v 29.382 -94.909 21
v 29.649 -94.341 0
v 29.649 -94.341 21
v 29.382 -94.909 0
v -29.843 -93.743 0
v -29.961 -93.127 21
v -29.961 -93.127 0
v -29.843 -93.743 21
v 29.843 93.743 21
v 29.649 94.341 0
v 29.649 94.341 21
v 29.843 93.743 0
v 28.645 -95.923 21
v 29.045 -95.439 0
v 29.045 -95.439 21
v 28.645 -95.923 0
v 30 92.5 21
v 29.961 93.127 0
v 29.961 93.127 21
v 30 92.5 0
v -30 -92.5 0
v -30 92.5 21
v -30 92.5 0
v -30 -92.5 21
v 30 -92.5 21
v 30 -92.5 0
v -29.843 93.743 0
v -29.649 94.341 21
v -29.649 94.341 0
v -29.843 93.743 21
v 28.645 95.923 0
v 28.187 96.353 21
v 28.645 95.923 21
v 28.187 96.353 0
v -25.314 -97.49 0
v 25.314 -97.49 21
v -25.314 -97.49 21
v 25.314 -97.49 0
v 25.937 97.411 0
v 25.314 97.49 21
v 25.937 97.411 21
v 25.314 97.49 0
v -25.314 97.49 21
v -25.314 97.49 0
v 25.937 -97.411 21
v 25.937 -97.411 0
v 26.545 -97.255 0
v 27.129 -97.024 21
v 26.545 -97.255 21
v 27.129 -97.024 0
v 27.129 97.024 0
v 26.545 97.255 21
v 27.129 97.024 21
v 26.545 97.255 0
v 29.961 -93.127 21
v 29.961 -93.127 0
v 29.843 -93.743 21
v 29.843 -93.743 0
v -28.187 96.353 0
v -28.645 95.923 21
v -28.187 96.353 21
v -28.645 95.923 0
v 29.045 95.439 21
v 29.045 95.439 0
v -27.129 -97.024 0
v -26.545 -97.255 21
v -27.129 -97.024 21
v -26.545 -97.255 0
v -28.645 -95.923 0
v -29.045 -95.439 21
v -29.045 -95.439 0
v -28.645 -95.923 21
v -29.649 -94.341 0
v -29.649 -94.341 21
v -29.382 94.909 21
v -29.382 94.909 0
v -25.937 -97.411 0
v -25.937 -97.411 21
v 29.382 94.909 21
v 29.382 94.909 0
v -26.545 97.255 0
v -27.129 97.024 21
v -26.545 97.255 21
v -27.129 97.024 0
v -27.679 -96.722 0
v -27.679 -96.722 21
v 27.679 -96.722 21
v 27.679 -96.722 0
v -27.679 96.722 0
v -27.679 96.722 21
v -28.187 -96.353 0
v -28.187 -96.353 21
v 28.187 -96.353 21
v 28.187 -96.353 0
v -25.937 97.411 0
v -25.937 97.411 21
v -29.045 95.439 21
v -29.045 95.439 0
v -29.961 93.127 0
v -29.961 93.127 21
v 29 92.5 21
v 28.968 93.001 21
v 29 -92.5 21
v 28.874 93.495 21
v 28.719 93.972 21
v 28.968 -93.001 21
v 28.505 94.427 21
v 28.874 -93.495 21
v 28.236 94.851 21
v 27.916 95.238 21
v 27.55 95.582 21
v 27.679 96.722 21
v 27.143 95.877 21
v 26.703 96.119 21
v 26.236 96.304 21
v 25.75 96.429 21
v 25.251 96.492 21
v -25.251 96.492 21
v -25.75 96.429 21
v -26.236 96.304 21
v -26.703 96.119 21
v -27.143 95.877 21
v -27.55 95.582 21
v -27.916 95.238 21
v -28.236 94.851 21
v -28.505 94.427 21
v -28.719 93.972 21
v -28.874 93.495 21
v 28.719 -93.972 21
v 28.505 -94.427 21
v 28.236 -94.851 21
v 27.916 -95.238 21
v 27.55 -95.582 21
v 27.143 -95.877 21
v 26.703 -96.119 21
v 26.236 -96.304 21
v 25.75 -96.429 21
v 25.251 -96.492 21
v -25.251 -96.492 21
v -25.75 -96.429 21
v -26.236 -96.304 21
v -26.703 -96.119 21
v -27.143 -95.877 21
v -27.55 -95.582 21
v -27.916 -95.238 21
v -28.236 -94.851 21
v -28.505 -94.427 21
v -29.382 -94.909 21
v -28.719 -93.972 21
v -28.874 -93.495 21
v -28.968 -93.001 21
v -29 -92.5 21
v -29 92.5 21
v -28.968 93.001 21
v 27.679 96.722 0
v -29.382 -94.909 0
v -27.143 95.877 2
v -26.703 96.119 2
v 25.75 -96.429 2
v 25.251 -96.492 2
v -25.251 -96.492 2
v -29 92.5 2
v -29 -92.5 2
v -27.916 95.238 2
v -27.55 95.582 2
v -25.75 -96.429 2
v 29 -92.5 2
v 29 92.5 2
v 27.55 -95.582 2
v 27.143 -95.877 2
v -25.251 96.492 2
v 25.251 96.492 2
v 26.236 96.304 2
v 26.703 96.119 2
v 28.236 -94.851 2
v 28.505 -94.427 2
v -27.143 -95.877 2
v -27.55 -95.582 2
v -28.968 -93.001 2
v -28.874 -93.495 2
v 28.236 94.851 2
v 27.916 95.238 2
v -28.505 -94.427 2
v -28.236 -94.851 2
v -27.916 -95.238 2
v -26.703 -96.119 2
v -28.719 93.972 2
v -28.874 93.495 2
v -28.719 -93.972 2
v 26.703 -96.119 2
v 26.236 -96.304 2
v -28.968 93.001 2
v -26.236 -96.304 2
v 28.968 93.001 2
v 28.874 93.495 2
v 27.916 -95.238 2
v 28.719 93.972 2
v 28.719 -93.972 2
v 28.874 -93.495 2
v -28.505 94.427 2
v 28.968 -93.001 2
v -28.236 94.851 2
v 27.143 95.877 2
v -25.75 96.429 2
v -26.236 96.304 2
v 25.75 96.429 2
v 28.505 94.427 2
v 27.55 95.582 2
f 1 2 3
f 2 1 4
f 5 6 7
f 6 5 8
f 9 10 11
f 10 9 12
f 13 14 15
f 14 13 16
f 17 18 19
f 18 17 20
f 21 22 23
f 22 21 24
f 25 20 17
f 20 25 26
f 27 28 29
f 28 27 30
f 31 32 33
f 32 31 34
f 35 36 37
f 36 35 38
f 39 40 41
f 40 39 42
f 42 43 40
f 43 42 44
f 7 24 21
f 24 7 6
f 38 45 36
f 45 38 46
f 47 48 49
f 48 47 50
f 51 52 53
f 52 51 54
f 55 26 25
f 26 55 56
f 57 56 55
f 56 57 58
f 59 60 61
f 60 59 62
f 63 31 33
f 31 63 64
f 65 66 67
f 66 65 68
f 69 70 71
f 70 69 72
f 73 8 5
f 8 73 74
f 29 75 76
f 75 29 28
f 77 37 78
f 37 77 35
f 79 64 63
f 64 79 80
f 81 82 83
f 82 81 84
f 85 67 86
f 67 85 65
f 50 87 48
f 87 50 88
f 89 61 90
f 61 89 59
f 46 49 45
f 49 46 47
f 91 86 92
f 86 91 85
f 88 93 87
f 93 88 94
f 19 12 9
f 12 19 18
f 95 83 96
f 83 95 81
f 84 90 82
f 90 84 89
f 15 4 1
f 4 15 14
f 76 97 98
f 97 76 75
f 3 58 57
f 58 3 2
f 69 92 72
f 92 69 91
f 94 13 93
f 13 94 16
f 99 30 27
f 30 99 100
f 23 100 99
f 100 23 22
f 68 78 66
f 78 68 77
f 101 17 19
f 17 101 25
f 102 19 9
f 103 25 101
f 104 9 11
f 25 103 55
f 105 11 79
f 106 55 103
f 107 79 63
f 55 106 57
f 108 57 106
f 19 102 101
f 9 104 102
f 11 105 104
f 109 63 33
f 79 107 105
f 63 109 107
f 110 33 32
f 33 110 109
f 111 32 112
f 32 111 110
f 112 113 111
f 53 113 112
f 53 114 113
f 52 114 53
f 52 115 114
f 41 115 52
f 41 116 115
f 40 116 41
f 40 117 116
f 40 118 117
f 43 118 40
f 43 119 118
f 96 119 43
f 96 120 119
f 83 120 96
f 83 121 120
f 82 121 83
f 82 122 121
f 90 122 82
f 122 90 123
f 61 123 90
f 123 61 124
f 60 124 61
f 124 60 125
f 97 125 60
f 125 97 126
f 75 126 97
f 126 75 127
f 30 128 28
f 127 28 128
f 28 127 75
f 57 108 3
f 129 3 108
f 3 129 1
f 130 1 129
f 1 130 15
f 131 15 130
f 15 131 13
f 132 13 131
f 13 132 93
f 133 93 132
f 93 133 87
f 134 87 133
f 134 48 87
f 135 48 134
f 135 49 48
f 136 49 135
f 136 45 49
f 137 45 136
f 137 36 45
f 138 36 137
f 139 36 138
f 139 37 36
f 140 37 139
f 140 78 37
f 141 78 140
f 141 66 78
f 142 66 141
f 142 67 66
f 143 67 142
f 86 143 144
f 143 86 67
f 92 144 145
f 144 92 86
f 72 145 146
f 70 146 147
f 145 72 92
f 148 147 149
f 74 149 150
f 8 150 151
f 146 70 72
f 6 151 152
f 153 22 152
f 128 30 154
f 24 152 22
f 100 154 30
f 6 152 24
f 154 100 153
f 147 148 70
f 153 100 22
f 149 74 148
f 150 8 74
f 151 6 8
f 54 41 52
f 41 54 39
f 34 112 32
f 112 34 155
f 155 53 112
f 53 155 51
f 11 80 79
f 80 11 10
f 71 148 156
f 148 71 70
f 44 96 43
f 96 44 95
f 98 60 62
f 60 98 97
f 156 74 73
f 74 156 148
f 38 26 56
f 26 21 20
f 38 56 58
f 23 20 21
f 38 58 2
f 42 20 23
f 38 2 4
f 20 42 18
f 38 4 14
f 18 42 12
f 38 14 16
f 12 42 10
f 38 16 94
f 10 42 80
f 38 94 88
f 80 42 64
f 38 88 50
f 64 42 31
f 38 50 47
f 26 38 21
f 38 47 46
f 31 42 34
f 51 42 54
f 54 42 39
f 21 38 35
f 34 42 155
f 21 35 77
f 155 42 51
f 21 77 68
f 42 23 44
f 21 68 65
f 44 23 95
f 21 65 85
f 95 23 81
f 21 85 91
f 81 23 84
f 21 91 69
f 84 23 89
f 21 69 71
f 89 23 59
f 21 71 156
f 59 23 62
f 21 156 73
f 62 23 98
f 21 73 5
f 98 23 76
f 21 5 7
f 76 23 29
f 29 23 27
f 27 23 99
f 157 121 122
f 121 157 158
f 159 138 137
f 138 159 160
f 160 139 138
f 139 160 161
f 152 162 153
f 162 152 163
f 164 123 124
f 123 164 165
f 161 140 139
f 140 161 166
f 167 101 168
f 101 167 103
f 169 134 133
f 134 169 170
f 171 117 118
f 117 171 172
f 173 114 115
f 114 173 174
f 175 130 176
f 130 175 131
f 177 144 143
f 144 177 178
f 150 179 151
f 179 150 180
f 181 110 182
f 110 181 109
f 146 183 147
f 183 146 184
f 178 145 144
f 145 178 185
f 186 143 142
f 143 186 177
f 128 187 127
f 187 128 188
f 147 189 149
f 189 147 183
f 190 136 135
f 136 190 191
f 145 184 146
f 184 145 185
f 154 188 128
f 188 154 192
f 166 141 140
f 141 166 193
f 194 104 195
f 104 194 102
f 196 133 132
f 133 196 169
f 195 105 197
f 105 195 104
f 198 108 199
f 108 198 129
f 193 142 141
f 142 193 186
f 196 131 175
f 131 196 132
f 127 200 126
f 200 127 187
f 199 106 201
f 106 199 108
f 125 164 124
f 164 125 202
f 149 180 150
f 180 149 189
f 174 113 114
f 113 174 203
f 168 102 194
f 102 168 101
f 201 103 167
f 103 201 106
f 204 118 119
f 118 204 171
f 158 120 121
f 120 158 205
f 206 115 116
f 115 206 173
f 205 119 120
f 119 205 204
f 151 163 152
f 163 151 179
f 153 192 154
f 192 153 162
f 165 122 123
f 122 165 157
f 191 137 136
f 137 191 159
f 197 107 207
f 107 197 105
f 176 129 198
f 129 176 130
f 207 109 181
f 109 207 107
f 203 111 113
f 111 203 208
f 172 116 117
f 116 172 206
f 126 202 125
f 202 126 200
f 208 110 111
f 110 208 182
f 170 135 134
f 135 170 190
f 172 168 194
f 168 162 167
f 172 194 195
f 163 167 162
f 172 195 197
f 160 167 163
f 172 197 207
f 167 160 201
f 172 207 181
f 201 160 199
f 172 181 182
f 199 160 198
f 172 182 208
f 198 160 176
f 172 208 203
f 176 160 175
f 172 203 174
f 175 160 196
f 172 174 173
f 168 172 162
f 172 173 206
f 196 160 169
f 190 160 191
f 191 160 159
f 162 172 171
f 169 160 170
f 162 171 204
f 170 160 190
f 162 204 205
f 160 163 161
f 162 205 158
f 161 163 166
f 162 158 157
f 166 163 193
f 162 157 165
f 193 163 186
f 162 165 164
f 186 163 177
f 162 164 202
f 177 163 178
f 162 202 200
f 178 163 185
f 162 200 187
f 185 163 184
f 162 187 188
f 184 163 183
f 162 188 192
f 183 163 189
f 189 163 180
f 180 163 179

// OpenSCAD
$fn = 50;


difference() {
	union() {
		hull() {
			translate(v = [-25.0000000000, 92.5000000000, 0]) {
				cylinder(h = 21, r = 5);
			}
			translate(v = [25.0000000000, 92.5000000000, 0]) {
				cylinder(h = 21, r = 5);
			}
			translate(v = [-25.0000000000, -92.5000000000, 0]) {
				cylinder(h = 21, r = 5);
			}
			translate(v = [25.0000000000, -92.5000000000, 0]) {
				cylinder(h = 21, r = 5);
			}
		}
	}
	union() {
		translate(v = [0, 0, 2]) {
			hull() {
				translate(v = [-25.0000000000, 92.5000000000, 0]) {
					cylinder(h = 19, r = 4);
				}
				translate(v = [25.0000000000, 92.5000000000, 0]) {
					cylinder(h = 19, r = 4);
				}
				translate(v = [-25.0000000000, -92.5000000000, 0]) {
					cylinder(h = 19, r = 4);
				}
				translate(v = [25.0000000000, -92.5000000000, 0]) {
					cylinder(h = 19, r = 4);
				}
			}
		}
	}
}
